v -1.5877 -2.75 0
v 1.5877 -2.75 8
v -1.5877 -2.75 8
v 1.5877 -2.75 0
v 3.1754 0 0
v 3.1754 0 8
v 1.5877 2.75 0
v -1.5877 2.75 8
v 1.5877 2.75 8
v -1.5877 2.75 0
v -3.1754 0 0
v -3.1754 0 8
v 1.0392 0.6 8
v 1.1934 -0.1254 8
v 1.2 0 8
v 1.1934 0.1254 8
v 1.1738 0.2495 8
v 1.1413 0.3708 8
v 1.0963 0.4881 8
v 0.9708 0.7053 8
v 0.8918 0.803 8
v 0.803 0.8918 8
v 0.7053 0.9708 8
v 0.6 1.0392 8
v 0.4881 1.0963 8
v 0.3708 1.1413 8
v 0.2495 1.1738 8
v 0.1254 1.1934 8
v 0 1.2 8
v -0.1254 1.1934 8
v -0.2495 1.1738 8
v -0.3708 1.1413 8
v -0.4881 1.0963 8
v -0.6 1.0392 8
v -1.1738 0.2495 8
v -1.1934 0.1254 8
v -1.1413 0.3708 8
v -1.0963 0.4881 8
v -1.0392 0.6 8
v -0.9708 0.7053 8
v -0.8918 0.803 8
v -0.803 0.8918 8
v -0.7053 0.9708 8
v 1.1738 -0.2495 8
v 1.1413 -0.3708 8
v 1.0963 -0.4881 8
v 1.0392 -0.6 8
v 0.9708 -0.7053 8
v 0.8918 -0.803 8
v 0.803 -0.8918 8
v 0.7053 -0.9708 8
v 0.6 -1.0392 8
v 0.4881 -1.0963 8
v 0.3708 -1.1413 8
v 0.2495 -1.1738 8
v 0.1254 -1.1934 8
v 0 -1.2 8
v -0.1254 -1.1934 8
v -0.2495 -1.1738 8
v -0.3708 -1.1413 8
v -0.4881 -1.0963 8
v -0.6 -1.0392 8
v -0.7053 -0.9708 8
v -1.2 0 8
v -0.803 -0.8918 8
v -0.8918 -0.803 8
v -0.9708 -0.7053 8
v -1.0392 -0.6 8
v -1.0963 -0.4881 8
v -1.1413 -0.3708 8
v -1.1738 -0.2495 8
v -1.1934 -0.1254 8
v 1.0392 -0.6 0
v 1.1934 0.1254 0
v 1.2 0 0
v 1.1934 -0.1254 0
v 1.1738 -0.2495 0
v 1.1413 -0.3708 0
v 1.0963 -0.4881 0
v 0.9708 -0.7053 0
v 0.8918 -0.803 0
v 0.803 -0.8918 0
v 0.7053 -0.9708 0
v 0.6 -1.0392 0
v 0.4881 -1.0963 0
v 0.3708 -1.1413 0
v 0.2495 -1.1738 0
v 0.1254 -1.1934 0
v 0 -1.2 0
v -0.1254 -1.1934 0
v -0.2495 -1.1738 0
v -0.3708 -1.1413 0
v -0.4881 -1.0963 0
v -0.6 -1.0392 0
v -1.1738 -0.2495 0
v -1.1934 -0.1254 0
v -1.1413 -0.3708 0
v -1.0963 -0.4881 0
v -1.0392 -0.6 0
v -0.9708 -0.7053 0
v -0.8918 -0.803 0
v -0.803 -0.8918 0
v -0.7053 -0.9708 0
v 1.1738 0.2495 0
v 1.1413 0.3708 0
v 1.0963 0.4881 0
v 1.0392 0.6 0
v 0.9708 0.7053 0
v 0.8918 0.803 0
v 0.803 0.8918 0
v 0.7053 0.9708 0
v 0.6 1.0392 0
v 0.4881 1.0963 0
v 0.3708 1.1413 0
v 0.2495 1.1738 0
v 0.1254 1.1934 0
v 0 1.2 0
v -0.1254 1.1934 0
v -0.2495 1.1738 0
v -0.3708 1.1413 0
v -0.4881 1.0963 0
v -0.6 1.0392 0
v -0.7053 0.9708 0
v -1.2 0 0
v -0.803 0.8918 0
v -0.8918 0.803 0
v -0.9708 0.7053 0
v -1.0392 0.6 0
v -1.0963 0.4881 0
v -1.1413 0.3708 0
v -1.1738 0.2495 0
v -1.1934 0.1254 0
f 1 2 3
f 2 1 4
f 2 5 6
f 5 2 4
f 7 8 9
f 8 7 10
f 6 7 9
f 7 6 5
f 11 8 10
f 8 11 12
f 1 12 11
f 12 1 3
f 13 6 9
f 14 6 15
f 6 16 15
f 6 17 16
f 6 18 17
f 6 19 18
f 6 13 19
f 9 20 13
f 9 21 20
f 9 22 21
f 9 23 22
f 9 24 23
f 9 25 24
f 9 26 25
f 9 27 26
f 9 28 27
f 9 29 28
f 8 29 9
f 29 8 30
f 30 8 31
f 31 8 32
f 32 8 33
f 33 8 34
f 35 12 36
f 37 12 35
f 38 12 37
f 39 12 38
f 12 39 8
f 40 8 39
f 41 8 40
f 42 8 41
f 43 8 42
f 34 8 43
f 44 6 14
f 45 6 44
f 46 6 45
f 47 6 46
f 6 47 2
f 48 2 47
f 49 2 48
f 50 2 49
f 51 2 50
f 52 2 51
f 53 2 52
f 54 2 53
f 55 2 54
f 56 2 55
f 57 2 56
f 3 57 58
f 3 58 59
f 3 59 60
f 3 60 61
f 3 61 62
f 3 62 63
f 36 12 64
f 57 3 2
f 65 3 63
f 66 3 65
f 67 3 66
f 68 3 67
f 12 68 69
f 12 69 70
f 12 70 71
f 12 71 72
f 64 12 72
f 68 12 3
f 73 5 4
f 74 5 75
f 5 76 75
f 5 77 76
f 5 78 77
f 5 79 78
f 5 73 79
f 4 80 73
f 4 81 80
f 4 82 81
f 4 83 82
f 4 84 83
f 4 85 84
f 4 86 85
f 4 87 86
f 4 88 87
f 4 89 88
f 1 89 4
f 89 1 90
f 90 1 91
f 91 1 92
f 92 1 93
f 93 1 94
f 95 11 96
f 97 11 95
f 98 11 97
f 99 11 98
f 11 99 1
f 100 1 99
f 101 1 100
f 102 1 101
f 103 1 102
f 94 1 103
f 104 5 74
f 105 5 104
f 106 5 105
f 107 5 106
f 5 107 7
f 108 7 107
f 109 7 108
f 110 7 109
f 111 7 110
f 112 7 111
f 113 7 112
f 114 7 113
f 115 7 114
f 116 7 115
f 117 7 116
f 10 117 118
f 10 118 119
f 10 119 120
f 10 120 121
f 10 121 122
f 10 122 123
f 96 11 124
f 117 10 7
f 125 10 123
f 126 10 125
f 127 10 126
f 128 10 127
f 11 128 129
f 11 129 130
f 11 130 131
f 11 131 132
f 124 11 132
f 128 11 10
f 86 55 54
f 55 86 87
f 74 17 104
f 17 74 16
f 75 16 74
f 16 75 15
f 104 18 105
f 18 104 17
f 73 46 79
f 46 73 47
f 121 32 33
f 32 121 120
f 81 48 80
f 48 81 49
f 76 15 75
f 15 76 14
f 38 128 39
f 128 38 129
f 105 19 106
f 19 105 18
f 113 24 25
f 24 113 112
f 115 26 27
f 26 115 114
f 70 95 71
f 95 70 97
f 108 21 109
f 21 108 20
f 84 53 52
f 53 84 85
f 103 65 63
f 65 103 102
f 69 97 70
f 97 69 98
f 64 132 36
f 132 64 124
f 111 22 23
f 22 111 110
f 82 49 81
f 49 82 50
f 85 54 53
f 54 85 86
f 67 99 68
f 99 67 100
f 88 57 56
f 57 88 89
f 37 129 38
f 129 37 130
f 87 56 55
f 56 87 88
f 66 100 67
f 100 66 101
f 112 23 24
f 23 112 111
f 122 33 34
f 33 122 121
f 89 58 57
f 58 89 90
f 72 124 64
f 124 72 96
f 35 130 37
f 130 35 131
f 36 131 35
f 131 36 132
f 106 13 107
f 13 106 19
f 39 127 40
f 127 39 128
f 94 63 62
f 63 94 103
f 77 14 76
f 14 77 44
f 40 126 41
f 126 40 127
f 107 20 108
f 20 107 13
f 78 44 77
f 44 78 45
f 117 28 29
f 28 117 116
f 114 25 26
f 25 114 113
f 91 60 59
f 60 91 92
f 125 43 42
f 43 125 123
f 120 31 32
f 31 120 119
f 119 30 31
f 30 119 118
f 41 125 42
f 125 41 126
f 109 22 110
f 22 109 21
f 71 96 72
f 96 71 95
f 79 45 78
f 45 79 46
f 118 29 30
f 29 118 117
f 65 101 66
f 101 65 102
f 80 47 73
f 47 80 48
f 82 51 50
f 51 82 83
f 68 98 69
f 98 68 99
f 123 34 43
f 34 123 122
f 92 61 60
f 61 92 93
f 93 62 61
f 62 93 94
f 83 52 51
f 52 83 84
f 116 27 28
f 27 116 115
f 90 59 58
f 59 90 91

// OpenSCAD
// Hex standoff, 8 mm long.
$fn = 60;
eps = 0.02;
thread_d = 2.4;
flat = 5.5;
length = 8;
chamfer = 1.2;
difference() {
    union() {
        cylinder(d = flat / cos(30), h = length, $fn = 6);
        cylinder(d1 = flat / cos(30) - 2 * chamfer, d2 = flat / cos(30), h = chamfer, $fn = 6);
        translate([0, 0, length - chamfer]) cylinder(d1 = flat / cos(30), d2 = flat / cos(30) - 2 * chamfer, h = chamfer, $fn = 6);
    }
    translate([0, 0, -eps]) cylinder(d = thread_d, h = length + 2 * eps);
}
